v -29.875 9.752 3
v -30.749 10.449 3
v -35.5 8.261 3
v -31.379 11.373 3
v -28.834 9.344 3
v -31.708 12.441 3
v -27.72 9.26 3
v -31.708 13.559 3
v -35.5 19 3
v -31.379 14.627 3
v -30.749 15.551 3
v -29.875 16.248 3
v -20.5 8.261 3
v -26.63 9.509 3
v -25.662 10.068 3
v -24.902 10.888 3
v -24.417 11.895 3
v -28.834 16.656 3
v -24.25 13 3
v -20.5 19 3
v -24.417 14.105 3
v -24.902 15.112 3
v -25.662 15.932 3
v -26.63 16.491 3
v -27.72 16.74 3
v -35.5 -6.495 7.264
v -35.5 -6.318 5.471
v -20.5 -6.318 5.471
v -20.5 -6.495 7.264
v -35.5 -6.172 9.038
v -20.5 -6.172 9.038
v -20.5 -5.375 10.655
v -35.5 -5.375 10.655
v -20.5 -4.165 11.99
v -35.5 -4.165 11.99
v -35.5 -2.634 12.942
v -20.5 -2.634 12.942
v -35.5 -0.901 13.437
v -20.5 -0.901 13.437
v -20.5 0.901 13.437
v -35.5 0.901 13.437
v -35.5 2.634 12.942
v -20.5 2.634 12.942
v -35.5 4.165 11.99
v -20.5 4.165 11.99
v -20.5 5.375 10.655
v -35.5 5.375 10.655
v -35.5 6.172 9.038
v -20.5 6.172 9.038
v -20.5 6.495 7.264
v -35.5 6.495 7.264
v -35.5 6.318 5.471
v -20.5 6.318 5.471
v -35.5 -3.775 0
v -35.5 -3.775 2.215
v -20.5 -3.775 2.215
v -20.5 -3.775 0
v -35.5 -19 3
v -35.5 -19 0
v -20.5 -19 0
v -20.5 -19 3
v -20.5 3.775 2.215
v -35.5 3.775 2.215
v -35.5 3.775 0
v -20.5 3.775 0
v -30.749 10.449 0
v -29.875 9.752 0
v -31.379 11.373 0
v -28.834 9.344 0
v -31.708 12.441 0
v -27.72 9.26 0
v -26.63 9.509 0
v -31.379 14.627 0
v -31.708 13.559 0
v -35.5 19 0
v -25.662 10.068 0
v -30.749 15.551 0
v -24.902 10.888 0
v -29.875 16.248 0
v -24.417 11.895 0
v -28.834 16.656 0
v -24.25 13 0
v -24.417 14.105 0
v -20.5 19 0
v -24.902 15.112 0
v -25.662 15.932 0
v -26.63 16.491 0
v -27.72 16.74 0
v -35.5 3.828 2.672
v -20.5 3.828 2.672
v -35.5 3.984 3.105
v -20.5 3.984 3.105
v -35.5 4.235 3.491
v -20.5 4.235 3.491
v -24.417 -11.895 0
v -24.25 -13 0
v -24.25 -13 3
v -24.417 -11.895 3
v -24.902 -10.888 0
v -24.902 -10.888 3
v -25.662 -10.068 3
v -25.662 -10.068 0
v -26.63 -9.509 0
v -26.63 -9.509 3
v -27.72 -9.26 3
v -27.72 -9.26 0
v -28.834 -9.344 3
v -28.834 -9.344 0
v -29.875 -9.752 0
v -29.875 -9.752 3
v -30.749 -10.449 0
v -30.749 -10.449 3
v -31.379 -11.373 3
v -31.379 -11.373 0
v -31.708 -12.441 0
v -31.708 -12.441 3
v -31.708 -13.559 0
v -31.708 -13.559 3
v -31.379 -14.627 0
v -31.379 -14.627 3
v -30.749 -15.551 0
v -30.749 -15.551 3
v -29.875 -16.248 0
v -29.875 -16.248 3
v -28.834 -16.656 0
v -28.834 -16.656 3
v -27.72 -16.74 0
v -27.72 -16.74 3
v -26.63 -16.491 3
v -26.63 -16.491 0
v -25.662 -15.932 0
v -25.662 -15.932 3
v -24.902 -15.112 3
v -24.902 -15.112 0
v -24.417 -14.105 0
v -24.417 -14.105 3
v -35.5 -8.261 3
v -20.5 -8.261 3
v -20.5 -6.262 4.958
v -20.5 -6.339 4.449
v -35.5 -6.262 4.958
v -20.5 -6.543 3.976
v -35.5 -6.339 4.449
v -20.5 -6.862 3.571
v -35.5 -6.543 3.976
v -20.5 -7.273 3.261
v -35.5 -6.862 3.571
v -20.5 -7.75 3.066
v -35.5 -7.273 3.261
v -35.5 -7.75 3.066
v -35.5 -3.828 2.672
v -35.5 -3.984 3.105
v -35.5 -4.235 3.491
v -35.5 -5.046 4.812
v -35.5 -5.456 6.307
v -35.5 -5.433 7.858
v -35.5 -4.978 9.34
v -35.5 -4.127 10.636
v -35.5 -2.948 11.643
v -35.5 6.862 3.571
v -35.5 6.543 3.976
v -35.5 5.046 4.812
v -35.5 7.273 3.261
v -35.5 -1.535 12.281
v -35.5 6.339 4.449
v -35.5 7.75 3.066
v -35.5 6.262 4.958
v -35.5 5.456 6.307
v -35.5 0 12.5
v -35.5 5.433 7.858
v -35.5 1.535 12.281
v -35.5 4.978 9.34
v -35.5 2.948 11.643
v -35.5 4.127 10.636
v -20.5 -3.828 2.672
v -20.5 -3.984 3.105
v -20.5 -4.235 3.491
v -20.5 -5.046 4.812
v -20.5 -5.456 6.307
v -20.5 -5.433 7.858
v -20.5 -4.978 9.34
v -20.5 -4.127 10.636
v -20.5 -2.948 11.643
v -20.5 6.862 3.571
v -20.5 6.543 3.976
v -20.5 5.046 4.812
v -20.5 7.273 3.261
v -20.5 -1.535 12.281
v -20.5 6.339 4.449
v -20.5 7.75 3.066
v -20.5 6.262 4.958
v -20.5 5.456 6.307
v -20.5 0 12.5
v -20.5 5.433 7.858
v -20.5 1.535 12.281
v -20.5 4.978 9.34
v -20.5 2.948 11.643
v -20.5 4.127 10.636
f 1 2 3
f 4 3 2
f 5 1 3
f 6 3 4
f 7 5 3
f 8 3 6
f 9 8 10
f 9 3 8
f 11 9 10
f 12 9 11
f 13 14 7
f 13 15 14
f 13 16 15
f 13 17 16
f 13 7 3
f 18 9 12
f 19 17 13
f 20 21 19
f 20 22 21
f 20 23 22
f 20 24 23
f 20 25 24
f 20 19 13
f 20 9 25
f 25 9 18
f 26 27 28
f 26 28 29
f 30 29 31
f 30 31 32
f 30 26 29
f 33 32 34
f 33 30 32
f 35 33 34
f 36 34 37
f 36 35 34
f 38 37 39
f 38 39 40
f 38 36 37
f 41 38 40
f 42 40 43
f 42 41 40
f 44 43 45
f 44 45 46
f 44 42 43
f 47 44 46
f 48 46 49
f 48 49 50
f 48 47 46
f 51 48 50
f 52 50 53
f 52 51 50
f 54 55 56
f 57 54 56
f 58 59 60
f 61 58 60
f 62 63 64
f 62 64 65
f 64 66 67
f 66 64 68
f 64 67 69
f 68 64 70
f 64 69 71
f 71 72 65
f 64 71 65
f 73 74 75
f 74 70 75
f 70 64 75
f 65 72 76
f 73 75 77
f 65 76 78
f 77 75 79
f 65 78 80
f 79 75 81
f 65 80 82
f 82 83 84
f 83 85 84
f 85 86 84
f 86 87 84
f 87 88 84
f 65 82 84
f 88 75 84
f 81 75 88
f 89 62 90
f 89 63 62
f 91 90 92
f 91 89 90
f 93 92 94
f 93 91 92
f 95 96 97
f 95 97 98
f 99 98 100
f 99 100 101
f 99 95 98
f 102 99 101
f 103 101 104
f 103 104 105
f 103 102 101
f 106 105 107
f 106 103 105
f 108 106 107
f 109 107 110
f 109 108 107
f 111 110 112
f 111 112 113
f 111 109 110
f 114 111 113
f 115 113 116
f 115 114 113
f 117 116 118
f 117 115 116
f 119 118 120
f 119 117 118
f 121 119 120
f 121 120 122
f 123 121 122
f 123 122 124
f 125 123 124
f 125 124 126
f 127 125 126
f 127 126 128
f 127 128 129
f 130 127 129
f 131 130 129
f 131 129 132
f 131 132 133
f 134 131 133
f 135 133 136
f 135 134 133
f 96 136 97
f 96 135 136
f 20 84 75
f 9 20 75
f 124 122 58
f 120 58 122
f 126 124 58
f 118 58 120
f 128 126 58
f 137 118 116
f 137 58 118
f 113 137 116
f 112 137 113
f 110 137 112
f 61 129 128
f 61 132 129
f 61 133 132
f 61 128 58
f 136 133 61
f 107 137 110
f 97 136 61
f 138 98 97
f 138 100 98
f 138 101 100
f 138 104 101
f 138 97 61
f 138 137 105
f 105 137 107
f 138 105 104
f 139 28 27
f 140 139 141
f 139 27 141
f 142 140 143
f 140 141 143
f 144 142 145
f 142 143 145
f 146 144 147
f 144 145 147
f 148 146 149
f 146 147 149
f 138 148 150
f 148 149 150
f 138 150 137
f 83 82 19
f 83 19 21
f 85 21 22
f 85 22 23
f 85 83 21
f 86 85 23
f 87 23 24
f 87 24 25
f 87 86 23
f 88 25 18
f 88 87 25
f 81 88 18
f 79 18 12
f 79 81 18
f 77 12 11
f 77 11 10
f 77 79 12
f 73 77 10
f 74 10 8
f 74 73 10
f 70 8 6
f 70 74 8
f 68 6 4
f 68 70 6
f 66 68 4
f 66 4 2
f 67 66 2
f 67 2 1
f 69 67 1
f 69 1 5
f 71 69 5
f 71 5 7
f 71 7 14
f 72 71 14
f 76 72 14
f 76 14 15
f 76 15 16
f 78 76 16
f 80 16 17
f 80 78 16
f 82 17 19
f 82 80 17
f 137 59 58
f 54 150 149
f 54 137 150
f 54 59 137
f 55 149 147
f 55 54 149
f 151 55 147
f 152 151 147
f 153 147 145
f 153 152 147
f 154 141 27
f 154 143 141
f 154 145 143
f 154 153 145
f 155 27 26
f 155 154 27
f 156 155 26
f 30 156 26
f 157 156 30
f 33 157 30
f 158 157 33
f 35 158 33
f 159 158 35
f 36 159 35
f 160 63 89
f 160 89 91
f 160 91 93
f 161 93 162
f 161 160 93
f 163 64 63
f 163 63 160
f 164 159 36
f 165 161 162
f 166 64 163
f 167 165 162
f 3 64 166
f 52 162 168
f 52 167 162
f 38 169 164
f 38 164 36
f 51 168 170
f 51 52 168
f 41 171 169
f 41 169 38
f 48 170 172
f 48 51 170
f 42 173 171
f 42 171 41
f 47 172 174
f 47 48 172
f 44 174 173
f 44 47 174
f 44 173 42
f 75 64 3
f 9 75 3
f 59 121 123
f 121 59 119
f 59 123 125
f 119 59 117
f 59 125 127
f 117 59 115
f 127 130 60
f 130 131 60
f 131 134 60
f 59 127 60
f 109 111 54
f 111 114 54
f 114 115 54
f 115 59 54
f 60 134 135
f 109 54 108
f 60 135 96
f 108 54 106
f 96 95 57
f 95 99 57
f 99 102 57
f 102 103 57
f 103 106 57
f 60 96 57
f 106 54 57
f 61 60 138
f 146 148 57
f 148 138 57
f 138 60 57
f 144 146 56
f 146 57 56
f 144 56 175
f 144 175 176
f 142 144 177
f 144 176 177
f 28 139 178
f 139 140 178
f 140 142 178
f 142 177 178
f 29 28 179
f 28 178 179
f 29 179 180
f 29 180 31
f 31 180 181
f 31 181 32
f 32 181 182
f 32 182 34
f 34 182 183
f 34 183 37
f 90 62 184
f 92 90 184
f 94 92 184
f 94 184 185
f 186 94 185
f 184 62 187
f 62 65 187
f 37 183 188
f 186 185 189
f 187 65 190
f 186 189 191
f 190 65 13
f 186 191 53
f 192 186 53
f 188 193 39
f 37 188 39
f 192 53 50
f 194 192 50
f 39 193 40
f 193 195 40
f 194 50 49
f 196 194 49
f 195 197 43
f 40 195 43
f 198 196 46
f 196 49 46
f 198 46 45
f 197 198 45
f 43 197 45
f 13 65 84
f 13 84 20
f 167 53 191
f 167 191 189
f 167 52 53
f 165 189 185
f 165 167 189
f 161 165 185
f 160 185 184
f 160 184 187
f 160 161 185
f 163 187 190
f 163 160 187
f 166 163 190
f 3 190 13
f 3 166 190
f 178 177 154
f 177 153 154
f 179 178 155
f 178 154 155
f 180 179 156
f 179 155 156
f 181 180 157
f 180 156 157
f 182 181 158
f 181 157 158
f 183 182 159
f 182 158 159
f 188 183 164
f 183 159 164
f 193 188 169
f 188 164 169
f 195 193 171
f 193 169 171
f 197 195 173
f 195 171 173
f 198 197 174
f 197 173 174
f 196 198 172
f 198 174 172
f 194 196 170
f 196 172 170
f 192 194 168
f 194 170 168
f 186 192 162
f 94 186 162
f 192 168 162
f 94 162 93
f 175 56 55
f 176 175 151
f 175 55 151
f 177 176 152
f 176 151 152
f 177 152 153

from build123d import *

# Parameters (mm, degrees)
SKETCH1_R           = 3.75
BOSS_EXTRUDE1_DEPTH = 3
SKETCH8_R           = 6.5
SKETCH8_R_2         = 5.5
BOSS_EXTRUDE4_DEPTH = 15
SKETCH9_W           = 15
SKETCH9_H           = 7.549834436
CUT_EXTRUDE5_DEPTH  = 15
FILLET3_R           = 2
FILLET4_R           = 2


with BuildPart() as part:
    # Sketch1 → Boss-Extrude1 (new body)
    with BuildSketch(Plane.XY):
        Polygon((-35.5, -19), (-20.5, -19), (-20.5, 13), (-20.5, 19), (-35.5, 19), align=None)
        with Locations((-28, 13)):
            Circle(SKETCH1_R, mode=Mode.SUBTRACT)
        with Locations((-28, -13)):
            Circle(SKETCH1_R, mode=Mode.SUBTRACT)
    extrude(amount=BOSS_EXTRUDE1_DEPTH)

    # Sketch8 → Boss-Extrude4 (add)
    with BuildSketch(Plane.ZY.offset(35.5)):
        with Locations((7, 0)):
            Circle(SKETCH8_R)
        with Locations((7, 0)):
            Circle(SKETCH8_R_2, mode=Mode.SUBTRACT)
    extrude(amount=-BOSS_EXTRUDE4_DEPTH)

    # Sketch9 → Cut-Extrude5 (cut)
    with BuildSketch(Plane.XY.offset(3)):
        with Locations((-28, 0)):
            Rectangle(SKETCH9_W, SKETCH9_H)
    extrude(amount=-CUT_EXTRUDE5_DEPTH, mode=Mode.SUBTRACT)

    # Fillet3
    fillet3_edges = [part.edges().sort_by_distance(p)[0] for p in [
        (-28, -5.123475383, 3),
        (-28, 5.123475383, 3),
    ]]
    fillet(fillet3_edges, radius=FILLET3_R)

    # Fillet4
    fillet4_edges = [part.edges().sort_by_distance(p)[0] for p in [
        (-28, -3.774917218, 3),
        (-28, 3.774917218, 3),
    ]]
    fillet(fillet4_edges, radius=FILLET4_R)


solid = part.part
